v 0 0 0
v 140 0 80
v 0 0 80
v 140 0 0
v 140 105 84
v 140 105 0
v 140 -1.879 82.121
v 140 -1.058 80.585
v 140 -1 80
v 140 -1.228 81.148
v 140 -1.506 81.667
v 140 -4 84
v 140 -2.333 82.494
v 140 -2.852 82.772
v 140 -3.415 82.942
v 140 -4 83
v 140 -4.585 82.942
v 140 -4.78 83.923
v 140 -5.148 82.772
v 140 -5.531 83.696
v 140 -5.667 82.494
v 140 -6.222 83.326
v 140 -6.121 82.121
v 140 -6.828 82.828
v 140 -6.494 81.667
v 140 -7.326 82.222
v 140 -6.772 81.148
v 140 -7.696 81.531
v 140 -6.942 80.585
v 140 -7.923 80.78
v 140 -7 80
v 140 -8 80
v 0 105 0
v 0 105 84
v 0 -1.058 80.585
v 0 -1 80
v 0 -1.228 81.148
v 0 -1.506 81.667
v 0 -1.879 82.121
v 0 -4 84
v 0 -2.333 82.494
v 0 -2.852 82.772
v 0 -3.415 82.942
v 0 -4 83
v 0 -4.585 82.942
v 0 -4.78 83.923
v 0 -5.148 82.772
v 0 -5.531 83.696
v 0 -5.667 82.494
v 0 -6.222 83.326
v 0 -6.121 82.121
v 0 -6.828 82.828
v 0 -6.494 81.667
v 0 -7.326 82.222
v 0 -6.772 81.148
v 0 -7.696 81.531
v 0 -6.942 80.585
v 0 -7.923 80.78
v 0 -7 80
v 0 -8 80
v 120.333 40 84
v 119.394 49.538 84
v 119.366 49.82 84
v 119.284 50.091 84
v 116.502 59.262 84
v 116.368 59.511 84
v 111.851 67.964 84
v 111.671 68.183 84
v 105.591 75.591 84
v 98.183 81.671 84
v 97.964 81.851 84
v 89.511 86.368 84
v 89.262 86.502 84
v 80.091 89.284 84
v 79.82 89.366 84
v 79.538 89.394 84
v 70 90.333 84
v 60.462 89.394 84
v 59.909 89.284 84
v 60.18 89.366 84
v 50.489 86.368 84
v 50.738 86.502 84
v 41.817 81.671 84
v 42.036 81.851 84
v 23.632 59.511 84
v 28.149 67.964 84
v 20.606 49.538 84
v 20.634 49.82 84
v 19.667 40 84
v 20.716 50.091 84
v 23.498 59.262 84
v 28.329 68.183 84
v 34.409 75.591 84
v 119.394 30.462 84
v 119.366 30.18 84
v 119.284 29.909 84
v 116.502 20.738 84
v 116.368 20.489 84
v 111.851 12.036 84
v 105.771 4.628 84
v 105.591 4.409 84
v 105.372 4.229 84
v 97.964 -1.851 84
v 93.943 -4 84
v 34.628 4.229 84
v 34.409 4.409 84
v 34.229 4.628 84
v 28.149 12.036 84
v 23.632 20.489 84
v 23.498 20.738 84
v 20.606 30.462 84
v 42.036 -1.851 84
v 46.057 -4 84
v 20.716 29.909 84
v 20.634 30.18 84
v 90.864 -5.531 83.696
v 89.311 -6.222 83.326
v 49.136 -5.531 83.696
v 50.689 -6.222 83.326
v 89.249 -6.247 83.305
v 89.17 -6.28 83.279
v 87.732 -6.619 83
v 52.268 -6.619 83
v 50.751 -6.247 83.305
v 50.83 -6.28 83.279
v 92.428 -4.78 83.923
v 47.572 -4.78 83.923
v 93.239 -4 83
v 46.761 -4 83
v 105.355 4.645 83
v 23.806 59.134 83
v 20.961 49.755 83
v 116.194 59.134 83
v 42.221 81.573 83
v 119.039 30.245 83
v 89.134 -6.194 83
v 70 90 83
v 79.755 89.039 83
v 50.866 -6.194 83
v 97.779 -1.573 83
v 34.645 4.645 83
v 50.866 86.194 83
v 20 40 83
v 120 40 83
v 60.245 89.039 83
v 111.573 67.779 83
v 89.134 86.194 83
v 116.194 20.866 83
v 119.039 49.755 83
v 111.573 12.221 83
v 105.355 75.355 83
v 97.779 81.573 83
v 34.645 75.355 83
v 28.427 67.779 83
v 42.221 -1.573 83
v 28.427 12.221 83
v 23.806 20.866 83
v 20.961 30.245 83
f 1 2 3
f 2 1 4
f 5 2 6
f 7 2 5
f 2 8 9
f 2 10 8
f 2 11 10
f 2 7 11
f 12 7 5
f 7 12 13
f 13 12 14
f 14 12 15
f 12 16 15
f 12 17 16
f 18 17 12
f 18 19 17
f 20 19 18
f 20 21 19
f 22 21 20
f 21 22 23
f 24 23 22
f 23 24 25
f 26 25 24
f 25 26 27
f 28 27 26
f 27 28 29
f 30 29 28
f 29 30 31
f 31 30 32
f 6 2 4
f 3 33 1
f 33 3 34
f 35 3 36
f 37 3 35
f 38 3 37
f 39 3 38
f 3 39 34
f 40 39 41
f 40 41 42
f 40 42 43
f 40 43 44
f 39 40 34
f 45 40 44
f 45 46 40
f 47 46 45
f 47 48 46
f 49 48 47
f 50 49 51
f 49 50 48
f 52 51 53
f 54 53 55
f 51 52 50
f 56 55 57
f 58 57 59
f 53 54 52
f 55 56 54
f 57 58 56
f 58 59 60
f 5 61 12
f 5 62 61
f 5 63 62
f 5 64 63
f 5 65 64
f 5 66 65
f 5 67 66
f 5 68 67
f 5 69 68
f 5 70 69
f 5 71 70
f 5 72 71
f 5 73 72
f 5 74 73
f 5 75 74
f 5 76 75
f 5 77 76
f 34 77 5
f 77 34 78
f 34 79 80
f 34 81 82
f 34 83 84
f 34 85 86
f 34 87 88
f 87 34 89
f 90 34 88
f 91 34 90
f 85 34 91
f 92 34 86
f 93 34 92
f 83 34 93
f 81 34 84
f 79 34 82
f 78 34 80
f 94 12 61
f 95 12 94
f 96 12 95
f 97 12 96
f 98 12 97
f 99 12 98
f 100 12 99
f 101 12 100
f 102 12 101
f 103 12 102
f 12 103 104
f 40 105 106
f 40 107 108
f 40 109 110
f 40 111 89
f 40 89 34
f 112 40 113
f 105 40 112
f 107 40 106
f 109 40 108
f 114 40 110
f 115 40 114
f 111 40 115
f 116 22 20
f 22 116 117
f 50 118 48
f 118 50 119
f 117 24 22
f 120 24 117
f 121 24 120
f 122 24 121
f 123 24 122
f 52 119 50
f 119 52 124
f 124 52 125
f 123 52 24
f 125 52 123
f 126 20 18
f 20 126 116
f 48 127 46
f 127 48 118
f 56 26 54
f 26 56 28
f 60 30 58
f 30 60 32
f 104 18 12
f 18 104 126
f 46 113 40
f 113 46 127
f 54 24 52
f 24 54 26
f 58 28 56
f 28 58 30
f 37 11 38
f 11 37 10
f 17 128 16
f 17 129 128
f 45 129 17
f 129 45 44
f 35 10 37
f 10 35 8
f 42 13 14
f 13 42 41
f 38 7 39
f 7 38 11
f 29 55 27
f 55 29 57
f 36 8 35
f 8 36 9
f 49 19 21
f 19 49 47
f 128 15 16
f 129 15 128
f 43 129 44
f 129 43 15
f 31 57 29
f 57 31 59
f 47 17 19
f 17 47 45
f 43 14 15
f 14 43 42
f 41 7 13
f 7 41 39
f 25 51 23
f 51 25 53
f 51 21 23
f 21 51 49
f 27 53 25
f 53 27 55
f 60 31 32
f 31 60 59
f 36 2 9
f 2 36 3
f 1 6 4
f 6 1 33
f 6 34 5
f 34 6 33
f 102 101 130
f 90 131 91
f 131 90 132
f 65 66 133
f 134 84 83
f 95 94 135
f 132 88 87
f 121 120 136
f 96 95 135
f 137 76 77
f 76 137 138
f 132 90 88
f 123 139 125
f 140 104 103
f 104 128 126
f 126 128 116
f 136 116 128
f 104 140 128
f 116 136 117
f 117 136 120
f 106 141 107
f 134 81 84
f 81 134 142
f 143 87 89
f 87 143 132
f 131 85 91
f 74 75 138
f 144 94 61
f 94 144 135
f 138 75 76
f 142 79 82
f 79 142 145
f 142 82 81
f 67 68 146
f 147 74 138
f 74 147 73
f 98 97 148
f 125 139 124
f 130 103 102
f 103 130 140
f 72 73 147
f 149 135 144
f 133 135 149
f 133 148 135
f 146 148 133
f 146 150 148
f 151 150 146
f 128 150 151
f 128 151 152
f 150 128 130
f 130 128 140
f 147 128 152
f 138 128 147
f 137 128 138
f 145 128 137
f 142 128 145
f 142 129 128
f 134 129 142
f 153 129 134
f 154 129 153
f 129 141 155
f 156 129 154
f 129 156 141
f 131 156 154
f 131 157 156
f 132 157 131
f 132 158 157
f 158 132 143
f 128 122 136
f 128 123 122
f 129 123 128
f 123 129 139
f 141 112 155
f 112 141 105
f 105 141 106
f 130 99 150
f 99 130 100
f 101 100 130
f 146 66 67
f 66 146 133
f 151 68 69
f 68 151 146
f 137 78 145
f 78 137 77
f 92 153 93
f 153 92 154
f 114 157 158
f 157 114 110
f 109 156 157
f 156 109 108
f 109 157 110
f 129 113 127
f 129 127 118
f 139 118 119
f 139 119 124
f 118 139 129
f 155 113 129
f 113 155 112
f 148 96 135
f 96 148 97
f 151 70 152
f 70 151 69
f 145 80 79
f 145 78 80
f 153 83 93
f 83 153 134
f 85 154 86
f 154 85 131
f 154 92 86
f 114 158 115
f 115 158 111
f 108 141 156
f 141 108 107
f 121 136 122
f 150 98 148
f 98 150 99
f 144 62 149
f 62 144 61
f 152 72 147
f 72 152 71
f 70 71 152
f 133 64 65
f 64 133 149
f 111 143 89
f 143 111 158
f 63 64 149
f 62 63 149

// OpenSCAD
$fn = 32;

sink_height = 82;
sink_to_wall = 105;
warmer_height = 155;
warmer_waist_height = 45;
floorprint_radius = 50;
warmer_waist_radius = 65;
sink_pipe_width = 46;
sink_to_pipe = 21;
sink_lip_diameter = 6;
platform_height = sink_height + 2;
platform_width = warmer_waist_radius * 2 + 10;
sink_lip_hold_width = sink_lip_diameter + 2;

module bottle_warmer() {
  rotate_extrude(convexity=10)
  polygon([
    [0,0],
    [floorprint_radius, 0],
    [warmer_waist_radius, warmer_waist_height],
    [floorprint_radius, warmer_height],
    [0, warmer_height]
  ]);
}

module platform() {
  module sink_lip_hold() {
    intersection() {
      translate([0, sink_lip_hold_width / 2, 0])
      cube([sink_lip_hold_width, sink_lip_hold_width, platform_width* 2], center=true);
      difference() {
        union() {
          cube([sink_lip_hold_width / 2, sink_lip_hold_width / 2, platform_width]);
          cylinder(d=sink_lip_hold_width, h=platform_width);
        }
        cylinder(d=sink_lip_diameter, h=platform_width);
      }
    }
  }

  difference() {
    union() {
      cube([
        platform_width,
        sink_to_wall,
        platform_height
      ]);
      translate([0, -sink_lip_hold_width / 2, platform_height - (sink_lip_hold_width / 2)])
        rotate([90, 0, 90])
          sink_lip_hold();
    }
    translate([platform_width / 2, sink_to_wall - warmer_waist_radius, platform_height-1])
      bottle_warmer();
  }
}

module main(){
  platform();
  // translate([platform_width / 2, sink_to_wall - warmer_waist_radius, platform_height])
  //   bottle_warmer();
}

main();
